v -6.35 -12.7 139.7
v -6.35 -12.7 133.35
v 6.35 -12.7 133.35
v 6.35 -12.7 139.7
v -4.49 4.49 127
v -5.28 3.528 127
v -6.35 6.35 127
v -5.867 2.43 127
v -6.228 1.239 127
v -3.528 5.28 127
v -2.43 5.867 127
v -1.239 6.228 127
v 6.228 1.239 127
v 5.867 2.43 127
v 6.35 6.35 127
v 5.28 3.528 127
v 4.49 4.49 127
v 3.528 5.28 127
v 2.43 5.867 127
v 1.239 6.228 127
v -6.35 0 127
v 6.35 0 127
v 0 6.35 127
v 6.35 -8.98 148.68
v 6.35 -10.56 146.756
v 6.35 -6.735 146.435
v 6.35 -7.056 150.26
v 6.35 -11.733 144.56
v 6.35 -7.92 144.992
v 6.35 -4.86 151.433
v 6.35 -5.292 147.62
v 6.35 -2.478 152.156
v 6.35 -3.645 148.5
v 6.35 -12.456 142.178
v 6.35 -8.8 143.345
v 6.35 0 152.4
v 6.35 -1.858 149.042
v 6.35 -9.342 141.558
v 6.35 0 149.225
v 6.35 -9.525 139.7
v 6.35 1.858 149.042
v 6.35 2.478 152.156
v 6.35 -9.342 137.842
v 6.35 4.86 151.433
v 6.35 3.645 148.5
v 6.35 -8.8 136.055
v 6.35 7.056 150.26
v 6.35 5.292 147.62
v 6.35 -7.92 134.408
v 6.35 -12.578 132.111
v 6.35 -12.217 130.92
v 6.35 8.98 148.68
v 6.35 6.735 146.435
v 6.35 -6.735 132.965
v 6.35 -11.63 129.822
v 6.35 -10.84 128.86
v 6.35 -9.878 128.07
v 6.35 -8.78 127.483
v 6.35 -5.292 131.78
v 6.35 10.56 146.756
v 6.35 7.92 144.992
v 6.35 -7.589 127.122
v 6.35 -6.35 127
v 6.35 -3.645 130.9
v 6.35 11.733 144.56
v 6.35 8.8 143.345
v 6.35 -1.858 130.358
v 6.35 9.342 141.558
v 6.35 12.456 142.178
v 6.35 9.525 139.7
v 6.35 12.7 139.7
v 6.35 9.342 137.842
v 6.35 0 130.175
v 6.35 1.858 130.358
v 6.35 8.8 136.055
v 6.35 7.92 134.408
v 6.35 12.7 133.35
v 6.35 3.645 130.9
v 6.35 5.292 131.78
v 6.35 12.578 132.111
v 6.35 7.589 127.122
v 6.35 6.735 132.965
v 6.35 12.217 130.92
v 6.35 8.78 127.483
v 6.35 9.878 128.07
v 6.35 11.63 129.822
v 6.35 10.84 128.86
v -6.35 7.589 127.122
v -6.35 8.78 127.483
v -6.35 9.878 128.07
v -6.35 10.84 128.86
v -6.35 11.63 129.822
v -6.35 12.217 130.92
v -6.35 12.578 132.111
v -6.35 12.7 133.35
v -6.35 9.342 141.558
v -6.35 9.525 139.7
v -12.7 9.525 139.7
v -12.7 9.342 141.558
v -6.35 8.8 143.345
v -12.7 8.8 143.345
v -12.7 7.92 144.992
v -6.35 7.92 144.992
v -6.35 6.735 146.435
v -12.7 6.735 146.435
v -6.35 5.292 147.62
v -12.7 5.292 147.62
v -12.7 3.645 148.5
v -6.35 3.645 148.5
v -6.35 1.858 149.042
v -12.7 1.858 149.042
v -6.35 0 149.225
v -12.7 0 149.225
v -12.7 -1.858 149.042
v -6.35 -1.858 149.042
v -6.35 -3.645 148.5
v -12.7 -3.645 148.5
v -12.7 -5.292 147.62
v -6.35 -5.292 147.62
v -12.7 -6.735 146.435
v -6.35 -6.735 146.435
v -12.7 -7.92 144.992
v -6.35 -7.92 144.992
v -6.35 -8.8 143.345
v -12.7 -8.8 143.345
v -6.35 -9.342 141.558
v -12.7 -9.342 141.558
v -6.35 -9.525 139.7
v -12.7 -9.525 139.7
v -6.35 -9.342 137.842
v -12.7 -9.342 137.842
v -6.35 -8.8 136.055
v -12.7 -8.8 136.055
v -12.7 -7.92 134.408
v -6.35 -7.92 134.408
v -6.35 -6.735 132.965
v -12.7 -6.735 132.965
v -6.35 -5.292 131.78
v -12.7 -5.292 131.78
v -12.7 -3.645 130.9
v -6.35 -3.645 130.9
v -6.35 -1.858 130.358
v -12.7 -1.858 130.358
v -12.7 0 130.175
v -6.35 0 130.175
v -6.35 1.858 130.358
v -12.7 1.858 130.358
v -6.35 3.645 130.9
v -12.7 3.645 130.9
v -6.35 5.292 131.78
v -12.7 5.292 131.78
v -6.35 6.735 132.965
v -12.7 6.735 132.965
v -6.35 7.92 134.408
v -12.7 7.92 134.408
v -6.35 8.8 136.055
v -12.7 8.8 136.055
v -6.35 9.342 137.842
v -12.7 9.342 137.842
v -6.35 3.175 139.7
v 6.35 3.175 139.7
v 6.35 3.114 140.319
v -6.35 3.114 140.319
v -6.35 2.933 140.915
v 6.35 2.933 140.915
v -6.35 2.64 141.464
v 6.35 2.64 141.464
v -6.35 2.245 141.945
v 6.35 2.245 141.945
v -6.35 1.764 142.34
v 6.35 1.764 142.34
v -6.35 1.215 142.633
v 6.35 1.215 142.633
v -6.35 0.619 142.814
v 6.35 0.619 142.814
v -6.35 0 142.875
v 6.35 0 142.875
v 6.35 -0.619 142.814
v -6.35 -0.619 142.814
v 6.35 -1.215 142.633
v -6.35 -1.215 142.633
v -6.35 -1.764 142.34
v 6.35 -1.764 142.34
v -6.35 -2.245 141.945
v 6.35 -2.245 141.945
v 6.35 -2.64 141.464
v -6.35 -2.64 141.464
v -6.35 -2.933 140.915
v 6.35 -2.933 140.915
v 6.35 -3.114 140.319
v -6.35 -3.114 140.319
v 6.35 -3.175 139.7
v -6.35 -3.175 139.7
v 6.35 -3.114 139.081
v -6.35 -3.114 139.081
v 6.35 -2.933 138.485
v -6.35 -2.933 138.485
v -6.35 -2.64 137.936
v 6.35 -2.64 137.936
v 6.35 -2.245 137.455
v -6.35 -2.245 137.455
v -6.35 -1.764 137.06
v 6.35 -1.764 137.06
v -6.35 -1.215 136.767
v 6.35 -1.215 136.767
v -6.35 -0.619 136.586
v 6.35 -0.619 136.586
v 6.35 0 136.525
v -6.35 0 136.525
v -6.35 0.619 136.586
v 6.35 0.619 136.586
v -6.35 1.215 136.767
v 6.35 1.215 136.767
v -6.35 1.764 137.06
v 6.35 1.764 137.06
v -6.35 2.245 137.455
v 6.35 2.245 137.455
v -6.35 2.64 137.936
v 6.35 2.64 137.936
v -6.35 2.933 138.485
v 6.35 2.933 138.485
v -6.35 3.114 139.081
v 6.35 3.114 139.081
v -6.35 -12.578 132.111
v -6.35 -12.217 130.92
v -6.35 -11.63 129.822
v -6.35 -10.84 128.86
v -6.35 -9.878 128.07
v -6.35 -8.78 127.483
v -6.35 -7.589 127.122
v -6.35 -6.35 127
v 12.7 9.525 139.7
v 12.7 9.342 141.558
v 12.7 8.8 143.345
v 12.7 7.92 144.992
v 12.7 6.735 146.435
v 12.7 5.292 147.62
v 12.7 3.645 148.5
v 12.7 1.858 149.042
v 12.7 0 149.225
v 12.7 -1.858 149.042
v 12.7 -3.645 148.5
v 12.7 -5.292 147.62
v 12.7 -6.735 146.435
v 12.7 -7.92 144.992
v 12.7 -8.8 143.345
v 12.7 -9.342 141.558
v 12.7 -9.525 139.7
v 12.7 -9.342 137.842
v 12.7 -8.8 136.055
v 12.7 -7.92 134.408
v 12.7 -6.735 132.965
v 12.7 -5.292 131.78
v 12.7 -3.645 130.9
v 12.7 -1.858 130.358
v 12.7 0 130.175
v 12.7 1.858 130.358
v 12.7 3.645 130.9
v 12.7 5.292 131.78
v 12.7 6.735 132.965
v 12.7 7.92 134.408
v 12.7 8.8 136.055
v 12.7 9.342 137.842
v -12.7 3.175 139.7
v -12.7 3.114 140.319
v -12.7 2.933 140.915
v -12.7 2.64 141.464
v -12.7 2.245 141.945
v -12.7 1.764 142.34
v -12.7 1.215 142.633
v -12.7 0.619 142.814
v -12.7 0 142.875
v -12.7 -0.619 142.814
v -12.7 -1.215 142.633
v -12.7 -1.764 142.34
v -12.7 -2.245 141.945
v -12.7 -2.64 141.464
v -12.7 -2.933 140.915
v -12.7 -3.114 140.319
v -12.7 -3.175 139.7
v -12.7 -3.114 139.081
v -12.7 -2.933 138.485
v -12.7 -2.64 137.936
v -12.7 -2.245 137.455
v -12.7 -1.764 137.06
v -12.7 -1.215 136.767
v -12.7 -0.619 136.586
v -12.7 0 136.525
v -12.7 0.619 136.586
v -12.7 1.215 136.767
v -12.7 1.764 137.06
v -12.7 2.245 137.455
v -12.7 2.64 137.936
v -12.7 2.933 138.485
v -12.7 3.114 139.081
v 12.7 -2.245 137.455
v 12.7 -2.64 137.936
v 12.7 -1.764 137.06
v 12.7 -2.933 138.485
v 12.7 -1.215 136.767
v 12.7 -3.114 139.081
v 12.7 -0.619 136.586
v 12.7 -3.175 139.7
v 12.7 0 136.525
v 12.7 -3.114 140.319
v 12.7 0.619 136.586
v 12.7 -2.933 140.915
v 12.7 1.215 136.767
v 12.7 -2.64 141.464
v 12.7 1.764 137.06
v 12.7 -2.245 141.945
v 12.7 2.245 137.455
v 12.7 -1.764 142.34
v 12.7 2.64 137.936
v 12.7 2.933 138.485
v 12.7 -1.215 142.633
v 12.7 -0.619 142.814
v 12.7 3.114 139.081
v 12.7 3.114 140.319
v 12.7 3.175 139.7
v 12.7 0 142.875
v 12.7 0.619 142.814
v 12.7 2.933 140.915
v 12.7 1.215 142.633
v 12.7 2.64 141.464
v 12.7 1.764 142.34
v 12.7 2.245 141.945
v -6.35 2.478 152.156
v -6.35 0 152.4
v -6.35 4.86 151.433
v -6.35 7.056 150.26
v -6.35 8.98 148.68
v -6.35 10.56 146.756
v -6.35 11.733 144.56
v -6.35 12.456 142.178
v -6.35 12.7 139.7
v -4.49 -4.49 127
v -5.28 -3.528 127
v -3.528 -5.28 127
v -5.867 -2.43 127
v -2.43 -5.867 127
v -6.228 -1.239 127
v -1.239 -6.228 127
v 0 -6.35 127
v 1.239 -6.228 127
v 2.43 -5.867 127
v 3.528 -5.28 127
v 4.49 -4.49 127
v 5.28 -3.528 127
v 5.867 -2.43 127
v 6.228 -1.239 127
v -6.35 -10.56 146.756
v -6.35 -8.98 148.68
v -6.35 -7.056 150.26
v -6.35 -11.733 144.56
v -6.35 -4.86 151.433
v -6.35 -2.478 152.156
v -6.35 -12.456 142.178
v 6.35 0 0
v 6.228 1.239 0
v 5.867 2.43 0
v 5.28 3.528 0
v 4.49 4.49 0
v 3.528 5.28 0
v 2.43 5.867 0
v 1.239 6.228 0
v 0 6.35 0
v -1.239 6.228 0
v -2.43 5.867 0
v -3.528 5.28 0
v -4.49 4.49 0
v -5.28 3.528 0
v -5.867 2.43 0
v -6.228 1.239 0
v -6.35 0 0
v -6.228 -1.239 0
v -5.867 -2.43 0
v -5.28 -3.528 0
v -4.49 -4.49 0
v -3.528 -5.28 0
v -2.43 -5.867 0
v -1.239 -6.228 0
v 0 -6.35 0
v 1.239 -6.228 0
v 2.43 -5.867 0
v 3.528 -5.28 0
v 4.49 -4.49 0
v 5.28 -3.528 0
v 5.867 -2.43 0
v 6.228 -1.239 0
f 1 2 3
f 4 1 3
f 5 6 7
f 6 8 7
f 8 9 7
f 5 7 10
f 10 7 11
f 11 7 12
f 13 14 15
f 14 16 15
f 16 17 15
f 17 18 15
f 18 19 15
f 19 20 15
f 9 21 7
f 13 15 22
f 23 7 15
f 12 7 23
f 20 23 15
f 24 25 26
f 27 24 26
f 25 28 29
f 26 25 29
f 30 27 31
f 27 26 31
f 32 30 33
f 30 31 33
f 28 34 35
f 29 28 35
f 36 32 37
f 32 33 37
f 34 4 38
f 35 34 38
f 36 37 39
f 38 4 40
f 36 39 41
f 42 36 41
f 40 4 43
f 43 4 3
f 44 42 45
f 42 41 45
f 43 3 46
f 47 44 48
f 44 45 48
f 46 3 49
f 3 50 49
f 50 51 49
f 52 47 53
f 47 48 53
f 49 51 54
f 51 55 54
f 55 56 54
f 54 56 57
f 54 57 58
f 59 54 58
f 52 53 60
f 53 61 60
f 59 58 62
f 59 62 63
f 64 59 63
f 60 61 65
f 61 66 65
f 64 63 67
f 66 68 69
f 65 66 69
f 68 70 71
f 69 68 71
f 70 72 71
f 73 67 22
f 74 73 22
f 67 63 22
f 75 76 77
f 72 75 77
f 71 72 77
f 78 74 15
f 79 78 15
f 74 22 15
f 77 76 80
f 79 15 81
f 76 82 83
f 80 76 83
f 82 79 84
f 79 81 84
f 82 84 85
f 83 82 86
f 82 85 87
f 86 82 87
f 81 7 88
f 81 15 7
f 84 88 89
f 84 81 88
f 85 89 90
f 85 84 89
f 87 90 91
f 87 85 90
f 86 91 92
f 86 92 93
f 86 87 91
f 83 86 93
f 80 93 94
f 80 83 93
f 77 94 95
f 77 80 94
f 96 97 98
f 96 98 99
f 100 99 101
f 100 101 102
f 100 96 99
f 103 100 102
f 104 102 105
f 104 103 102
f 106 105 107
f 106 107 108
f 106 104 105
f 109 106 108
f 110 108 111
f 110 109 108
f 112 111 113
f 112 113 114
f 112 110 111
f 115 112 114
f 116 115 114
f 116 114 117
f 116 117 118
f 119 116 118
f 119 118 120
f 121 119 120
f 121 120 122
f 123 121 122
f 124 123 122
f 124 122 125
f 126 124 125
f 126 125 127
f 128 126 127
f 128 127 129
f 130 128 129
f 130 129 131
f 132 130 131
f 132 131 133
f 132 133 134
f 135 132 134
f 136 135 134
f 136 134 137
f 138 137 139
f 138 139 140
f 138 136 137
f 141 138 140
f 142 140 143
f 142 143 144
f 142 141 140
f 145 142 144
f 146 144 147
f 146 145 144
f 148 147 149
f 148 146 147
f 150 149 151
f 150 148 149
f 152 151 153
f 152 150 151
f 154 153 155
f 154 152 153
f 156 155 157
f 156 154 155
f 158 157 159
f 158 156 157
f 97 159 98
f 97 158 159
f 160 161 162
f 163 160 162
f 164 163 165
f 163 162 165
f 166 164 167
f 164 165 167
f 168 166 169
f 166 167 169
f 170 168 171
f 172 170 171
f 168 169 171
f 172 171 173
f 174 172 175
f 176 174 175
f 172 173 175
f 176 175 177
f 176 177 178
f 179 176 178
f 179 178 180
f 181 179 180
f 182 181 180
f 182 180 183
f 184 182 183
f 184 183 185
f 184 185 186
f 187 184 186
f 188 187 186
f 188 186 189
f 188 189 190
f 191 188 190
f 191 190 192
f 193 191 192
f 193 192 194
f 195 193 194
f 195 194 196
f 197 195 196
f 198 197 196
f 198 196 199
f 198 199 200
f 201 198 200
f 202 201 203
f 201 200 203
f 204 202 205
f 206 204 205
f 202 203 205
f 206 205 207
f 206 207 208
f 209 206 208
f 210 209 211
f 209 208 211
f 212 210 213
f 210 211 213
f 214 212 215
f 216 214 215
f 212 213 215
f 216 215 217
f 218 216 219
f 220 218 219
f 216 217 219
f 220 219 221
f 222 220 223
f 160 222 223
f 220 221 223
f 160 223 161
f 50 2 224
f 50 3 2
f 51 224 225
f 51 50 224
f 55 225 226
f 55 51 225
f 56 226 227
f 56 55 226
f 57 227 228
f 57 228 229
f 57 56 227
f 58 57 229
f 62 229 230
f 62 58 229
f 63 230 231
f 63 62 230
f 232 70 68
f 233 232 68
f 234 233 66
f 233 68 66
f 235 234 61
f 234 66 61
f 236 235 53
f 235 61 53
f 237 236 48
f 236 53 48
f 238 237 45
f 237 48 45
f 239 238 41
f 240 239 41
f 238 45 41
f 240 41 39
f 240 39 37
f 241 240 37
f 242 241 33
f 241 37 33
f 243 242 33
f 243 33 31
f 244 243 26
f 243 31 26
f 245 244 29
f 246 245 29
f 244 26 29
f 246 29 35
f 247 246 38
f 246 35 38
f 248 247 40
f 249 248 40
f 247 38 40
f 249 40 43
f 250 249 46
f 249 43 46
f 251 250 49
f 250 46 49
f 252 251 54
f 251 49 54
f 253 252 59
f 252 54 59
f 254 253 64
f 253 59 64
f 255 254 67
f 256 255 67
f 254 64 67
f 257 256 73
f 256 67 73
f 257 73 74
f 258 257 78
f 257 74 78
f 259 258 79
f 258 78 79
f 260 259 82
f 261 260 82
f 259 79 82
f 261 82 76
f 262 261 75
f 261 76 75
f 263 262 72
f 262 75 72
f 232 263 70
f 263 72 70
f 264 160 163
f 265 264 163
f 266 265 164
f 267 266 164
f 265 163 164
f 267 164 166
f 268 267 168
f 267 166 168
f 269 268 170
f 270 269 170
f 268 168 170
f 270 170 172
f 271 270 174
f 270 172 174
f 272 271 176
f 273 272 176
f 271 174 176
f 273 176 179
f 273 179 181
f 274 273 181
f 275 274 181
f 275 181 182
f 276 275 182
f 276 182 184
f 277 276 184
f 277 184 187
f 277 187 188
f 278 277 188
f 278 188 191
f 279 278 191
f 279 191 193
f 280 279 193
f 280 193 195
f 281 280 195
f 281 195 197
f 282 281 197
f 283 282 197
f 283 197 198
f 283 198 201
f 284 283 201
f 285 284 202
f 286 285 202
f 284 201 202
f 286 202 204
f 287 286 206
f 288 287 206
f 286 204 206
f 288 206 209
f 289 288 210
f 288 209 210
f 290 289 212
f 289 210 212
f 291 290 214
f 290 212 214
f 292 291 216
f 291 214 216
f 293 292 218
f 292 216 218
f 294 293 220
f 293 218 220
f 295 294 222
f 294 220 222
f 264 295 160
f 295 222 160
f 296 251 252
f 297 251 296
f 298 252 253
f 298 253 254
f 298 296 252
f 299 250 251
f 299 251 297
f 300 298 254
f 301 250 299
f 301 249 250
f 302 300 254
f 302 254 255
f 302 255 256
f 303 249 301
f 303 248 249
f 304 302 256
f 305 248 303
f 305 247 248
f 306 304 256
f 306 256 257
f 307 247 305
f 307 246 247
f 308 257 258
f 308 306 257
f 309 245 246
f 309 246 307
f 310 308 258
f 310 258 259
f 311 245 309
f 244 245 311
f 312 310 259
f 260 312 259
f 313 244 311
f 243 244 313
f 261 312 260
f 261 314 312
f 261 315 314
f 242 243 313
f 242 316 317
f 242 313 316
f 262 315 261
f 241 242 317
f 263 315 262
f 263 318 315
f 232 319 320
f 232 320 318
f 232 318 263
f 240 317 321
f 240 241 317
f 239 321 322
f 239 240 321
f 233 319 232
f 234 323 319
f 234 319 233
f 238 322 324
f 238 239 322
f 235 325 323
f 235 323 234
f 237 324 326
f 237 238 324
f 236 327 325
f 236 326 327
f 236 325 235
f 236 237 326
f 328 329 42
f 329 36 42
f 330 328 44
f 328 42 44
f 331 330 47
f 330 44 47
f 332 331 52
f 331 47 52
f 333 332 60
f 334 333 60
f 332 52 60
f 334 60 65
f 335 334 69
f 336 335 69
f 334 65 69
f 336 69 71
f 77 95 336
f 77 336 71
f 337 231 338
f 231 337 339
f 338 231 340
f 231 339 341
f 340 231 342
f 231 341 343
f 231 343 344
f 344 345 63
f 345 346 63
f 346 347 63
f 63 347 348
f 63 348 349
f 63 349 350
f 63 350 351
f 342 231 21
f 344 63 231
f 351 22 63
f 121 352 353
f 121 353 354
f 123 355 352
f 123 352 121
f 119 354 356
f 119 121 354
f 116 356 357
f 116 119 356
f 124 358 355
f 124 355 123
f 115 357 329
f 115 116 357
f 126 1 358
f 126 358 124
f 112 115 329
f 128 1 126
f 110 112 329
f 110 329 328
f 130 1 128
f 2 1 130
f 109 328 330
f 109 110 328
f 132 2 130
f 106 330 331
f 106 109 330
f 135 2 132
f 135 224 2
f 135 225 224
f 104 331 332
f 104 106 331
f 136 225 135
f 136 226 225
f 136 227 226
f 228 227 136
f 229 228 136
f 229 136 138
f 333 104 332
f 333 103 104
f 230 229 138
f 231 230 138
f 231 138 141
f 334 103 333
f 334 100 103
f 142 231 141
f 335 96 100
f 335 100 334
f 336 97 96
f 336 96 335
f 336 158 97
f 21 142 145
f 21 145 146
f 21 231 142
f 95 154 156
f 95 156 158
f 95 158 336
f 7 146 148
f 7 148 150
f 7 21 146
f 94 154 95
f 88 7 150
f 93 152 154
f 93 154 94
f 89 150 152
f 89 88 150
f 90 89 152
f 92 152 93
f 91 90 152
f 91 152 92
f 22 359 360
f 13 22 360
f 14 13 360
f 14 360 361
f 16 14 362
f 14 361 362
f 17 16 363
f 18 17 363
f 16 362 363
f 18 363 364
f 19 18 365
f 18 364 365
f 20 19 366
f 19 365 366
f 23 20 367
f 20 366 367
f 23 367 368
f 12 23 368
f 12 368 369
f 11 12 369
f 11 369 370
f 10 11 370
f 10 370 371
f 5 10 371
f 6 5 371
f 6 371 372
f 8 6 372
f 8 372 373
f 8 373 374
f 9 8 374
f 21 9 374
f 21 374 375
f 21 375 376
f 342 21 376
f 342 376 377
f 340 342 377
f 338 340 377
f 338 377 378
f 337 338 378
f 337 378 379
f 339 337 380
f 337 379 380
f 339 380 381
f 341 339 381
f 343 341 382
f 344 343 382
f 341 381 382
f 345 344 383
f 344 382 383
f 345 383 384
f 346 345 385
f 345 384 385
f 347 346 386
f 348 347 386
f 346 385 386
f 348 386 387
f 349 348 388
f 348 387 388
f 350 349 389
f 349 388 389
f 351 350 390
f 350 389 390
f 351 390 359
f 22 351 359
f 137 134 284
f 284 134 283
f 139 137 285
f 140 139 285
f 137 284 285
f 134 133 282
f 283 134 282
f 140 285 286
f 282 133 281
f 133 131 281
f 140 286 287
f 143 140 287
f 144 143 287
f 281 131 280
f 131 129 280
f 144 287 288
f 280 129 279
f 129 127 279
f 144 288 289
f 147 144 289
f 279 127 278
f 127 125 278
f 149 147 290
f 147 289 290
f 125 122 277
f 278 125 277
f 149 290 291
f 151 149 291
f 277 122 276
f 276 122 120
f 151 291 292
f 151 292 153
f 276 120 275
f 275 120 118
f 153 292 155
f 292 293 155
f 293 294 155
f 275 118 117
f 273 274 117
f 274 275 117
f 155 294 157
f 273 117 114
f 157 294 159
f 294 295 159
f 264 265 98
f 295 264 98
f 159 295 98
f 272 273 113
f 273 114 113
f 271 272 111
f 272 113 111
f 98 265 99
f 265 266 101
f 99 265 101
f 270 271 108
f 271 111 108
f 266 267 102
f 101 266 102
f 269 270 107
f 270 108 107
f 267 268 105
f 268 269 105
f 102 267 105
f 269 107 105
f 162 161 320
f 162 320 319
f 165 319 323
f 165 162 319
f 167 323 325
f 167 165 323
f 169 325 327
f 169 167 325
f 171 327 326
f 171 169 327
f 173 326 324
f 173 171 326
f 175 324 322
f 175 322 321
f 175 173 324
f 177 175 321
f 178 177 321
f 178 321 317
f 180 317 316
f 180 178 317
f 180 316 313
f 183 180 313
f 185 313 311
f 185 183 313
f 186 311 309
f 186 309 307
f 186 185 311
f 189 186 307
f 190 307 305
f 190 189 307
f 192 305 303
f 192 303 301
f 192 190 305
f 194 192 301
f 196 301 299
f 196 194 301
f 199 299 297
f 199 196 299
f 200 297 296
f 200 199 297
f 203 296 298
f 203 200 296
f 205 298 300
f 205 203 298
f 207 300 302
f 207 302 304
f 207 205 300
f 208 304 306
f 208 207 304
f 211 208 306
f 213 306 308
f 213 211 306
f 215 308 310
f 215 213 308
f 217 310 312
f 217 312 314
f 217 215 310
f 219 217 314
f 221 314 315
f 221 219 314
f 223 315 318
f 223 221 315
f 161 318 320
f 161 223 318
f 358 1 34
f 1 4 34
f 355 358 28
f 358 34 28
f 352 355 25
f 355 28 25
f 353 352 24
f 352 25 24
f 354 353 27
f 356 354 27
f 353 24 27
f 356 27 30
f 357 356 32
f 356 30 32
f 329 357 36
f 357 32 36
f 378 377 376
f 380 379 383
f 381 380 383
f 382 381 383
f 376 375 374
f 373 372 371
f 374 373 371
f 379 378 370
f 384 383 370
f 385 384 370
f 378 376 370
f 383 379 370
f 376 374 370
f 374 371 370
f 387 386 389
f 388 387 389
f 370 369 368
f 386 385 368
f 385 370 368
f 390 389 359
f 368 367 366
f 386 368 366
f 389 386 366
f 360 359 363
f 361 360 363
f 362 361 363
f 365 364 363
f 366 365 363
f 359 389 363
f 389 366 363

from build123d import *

# Parameters (mm, degrees)
F0_R          = 6.35
F1_DEPTH      = 127
F2_W          = 12.7
F2_H          = 25.4
F3_DEPTH      = 25.4
F4_R          = 9.525
F4_R_2        = 3.175
F5_DEPTH      = 6.35
F5_DEPTH_BACK = 19.05
F6_DEPTH      = 25.4
F7_R          = 6.34999
F8_R          = 12.69999


# Not quite as in the source:
# - a fillet or chamfer is up to 0.001 mm smaller than in the source, because OpenCascade refuses the exact size


with BuildPart() as f1:
    # F0 (on Top) → F1 (new body)
    with BuildSketch(Plane.XY):
        Circle(F0_R)
    extrude(amount=F1_DEPTH)

    # F2 (on face) → F3 (join)
    with BuildSketch(Plane.XY.offset(127)):
        Rectangle(F2_W, F2_H)
    extrude(amount=F3_DEPTH)

    # F4 (on face) → F5 (join, two sides)
    with BuildSketch(Plane.YZ.offset(6.35)) as f5_sk:
        with Locations((0, 139.7)):
            Circle(F4_R)
        with Locations((0, 139.7)):
            Circle(F4_R_2, mode=Mode.SUBTRACT)
    extrude(amount=F5_DEPTH)
    extrude(f5_sk.sketch, amount=-F5_DEPTH_BACK)

    # F6 (cut): a face of the model
    f6_faces = [f1.faces().sort_by_distance(p)[0] for p in [
        (6.35, 0, 139.7),
    ]]
    extrude(f6_faces, amount=-F6_DEPTH, mode=Mode.SUBTRACT)

    # F7 (radius 6.35 in the source; OpenCascade refuses exactly that, so slightly less here)
    f7_edges = [f1.edges().sort_by_distance(p)[0] for p in [
        (0, -12.7, 127),
        (0, 12.7, 127),
    ]]
    fillet(f7_edges, radius=F7_R)

    # F8 (radius 12.7 in the source; OpenCascade refuses exactly that, so slightly less here)
    f8_edges = [f1.edges().sort_by_distance(p)[0] for p in [
        (0, -12.7, 152.4),
        (0, 12.7, 152.4),
    ]]
    fillet(f8_edges, radius=F8_R)


solid = f1.part
